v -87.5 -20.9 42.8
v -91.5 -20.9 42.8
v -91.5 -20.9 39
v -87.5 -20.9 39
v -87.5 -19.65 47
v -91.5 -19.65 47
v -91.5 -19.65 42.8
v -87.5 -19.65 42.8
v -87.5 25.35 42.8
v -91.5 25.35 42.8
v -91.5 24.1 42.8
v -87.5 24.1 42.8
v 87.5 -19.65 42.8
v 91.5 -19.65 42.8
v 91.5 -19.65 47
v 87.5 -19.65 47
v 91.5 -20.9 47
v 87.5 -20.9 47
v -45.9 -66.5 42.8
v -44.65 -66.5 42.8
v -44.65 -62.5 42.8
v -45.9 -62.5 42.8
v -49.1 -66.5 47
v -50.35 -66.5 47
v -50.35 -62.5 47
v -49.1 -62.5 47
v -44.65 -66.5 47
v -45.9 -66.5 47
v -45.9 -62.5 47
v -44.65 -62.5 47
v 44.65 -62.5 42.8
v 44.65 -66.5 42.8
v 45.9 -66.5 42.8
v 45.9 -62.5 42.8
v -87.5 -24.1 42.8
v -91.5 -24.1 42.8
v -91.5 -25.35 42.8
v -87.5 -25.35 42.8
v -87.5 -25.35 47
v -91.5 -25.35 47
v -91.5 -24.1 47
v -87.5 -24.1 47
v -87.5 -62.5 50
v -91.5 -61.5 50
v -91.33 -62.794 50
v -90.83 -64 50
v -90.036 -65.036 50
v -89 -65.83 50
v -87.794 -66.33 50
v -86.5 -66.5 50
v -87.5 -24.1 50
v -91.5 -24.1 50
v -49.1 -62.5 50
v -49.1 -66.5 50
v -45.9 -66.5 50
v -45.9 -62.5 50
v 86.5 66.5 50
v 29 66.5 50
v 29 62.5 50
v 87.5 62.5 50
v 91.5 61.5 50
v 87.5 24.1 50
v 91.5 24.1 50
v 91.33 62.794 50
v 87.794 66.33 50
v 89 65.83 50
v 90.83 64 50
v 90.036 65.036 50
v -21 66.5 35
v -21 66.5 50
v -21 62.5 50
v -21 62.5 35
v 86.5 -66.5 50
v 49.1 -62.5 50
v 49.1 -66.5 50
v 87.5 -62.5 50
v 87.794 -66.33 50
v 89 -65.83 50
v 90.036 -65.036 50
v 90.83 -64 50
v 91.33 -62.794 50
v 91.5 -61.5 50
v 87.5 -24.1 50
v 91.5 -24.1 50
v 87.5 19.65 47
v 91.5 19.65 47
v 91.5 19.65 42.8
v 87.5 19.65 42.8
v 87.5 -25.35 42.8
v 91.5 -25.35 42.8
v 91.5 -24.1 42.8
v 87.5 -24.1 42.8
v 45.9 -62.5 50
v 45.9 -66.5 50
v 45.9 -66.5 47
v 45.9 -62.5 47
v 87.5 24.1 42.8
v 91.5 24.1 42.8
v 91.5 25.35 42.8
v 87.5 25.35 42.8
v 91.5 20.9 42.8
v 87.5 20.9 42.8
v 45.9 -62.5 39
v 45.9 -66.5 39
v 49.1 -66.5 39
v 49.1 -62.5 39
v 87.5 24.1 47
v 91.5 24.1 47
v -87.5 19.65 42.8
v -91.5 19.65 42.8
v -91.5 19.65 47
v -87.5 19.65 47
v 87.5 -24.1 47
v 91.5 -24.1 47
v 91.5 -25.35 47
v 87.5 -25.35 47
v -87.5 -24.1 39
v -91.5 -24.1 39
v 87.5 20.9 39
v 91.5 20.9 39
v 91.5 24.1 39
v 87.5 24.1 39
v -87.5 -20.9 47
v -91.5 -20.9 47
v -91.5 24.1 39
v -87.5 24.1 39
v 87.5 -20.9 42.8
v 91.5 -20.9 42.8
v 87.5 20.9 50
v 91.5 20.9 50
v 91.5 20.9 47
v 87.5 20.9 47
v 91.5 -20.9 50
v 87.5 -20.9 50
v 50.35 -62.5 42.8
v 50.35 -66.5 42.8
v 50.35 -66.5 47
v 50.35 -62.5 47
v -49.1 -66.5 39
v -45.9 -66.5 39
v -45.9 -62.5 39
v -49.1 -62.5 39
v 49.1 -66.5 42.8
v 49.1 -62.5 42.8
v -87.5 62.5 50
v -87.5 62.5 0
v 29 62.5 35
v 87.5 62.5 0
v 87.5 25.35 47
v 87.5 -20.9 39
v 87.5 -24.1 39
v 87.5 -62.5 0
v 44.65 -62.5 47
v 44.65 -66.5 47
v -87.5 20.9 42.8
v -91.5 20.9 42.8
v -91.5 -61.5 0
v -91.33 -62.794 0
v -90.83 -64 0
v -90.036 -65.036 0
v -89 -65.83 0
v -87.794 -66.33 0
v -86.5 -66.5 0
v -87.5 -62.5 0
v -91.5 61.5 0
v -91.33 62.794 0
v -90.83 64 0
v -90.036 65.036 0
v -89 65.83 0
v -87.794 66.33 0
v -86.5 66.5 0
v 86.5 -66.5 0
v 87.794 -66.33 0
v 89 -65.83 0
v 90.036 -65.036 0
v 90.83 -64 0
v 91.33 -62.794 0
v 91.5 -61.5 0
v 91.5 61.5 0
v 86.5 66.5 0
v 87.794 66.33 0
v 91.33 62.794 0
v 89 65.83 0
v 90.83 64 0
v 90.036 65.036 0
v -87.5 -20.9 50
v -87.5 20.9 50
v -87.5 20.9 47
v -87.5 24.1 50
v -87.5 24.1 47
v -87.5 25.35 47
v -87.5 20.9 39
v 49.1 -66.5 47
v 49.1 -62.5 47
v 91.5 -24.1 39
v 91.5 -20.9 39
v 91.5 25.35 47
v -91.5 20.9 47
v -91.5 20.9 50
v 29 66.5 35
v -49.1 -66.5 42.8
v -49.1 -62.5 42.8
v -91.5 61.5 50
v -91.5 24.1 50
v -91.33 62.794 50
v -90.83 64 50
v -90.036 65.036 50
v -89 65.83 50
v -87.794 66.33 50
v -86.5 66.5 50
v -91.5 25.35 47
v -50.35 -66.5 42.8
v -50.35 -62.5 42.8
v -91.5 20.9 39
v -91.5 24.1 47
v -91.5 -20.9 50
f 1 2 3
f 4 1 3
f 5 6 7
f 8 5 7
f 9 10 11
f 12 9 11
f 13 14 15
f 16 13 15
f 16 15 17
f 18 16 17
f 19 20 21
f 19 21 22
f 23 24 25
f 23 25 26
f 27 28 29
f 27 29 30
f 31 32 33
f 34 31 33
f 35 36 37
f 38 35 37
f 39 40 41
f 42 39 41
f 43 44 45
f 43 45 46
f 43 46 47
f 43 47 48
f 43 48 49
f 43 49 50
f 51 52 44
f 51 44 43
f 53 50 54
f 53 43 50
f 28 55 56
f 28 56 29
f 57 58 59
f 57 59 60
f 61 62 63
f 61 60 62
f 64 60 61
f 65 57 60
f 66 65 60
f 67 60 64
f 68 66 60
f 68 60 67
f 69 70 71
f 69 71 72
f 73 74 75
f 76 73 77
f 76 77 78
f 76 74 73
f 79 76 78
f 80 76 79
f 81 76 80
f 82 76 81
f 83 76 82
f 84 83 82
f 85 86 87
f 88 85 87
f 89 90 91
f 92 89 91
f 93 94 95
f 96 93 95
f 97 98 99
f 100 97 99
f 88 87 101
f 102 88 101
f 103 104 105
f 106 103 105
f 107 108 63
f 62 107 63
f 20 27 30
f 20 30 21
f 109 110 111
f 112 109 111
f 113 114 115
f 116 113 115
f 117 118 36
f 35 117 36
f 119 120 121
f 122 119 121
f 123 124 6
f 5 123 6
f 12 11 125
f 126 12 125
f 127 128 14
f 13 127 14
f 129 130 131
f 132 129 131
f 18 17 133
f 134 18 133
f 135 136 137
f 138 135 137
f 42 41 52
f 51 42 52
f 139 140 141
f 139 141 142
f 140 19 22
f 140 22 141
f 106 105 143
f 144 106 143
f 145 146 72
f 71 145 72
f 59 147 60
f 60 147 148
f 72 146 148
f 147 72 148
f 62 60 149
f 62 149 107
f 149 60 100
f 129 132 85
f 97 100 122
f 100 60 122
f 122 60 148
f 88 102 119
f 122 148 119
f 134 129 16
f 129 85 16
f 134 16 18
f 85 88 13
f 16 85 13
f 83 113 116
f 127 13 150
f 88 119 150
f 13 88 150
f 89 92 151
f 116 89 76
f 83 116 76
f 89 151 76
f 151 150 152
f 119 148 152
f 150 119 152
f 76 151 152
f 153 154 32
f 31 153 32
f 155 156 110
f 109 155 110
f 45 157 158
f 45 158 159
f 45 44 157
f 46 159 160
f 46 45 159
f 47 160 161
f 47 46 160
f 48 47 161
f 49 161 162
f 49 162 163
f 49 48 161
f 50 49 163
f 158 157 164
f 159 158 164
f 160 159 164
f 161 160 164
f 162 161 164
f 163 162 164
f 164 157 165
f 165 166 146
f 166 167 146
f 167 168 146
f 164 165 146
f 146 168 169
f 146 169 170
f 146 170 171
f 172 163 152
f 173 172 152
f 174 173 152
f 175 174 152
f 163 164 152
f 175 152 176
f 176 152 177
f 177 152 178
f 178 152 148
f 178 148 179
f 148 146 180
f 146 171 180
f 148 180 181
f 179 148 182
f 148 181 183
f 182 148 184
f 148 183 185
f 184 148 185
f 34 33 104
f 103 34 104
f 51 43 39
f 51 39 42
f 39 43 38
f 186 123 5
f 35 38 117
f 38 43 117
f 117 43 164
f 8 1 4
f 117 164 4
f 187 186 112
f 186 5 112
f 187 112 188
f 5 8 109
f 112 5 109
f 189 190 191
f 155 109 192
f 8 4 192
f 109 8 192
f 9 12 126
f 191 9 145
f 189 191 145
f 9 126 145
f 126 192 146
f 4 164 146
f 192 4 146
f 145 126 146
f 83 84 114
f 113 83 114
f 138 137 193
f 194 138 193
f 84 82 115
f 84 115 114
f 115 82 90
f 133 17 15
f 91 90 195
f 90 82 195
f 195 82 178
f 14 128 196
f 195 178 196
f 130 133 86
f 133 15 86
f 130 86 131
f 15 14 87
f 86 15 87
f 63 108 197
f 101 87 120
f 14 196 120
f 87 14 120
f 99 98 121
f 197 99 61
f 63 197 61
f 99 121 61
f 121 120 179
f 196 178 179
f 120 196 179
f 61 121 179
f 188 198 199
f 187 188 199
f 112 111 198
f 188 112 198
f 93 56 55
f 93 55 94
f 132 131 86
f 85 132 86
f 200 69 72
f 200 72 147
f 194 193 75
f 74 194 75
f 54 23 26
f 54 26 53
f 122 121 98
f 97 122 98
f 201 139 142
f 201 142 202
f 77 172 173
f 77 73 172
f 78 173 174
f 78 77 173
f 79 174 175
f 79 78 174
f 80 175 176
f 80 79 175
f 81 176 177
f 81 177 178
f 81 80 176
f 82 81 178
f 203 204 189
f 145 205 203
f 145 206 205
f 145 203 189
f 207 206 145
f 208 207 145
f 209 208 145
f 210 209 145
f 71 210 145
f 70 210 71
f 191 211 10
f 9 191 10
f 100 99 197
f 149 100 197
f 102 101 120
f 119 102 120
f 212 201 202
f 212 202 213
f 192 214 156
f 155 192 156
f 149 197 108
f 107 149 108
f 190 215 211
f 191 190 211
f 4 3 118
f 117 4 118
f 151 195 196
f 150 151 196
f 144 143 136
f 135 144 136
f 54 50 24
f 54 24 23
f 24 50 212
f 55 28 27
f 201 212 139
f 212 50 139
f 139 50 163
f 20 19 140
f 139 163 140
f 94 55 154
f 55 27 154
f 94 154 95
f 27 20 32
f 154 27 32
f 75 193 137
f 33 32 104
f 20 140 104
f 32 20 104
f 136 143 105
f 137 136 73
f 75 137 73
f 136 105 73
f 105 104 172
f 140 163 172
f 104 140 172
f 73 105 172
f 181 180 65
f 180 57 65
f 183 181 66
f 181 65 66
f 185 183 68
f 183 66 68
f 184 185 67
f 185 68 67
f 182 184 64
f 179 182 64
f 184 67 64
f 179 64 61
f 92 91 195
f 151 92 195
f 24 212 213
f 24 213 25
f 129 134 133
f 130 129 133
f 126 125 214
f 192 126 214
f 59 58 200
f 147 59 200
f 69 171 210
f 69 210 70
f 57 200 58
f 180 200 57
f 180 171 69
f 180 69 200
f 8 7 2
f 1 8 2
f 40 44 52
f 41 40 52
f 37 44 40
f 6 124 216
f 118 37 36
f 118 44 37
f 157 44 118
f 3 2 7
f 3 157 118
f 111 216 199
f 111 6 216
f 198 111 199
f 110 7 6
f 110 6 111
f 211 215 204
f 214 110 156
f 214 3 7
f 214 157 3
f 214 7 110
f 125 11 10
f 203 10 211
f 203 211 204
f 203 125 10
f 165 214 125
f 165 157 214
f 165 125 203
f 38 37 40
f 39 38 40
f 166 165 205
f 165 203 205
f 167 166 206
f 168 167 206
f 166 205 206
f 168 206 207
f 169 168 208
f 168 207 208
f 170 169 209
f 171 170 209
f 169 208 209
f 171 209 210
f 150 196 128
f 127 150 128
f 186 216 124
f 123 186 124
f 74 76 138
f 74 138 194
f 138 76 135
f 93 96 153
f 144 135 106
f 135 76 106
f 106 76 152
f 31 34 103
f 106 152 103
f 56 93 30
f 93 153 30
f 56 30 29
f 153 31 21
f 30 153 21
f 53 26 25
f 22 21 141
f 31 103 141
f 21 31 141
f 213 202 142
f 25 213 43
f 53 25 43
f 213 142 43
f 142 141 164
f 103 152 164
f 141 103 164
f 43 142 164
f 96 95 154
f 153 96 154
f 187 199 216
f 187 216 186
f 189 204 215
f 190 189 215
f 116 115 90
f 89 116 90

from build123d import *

# Parameters (mm, degrees)
ESQUISSE2_W             = 183
ESQUISSE2_H             = 133
BOSS_EXTRU_2_DEPTH      = 50
ESQUISSE3_W             = 50
ESQUISSE3_H             = 15
ENL_V_MAT_EXTRU_1_DEPTH = 50
CONG_1_R                = 5
ENL_V_MAT_EXTRU_3_DEPTH = 4
ENL_V_MAT_EXTRU_4_DEPTH = 4
ENL_V_MAT_EXTRU_5_DEPTH = 4


with BuildPart() as part:
    # Esquisse2 → Boss.-Extru.2 (new body)
    with BuildSketch(Plane.XY):
        Rectangle(ESQUISSE2_W, ESQUISSE2_H)
        Polygon((-85.996240602, -62.5), (-87.5, -62.5), (-87.5, 62.5), (87.5, 62.5), (87.5, -62.5), align=None, mode=Mode.SUBTRACT)
    extrude(amount=BOSS_EXTRU_2_DEPTH)

    # Esquisse3 → Enlèv. mat.-Extru.1 (cut)
    with BuildSketch(Plane(origin=(0, 66.5, 0), x_dir=(1, 0, 0), z_dir=(0, 1, 0))):
        with Locations((4, -42.5)):
            Rectangle(ESQUISSE3_W, ESQUISSE3_H)
    extrude(amount=-ENL_V_MAT_EXTRU_1_DEPTH, mode=Mode.SUBTRACT)

    # Congé1
    cong_1_edges = [part.edges().sort_by_distance(p)[0] for p in [
        (91.5, -66.5, 25),
        (91.5, 66.5, 25),
        (-91.5, 66.5, 25),
        (-91.5, -66.5, 25),
    ]]
    fillet(cong_1_edges, radius=CONG_1_R)

    # Esquisse6 → Enlèv. mat.-Extru.3 (cut)
    with BuildSketch(Plane(origin=(91.5, 0, 0), x_dir=(0, 0, -1), z_dir=(1, 0, 0))):
        Polygon((-50, 20.9), (-47, 20.9), (-47, 19.65), (-42.8, 19.65), (-42.8, 20.9), (-39, 20.9), (-39, 24.1), (-42.8, 24.1), (-42.8, 25.35), (-47, 25.35), (-47, 24.1), (-50, 24.1), align=None)
        Polygon((-50, -24.1), (-47, -24.1), (-47, -25.35), (-42.8, -25.35), (-42.8, -24.1), (-39, -24.1), (-39, -20.9), (-42.8, -20.9), (-42.8, -19.65), (-47, -19.65), (-47, -20.9), (-50, -20.9), align=None)
    extrude(amount=-ENL_V_MAT_EXTRU_3_DEPTH, mode=Mode.SUBTRACT)

    # Esquisse7 → Enlèv. mat.-Extru.4 (cut)
    with BuildSketch(Plane.ZY.offset(91.5)):
        Polygon((47, 20.9), (50, 20.9), (50, 24.1), (47, 24.1), (47, 25.35), (42.8, 25.35), (42.8, 24.1), (39, 24.1), (39, 20.9), (42.8, 20.9), (42.8, 19.65), (47, 19.65), align=None)
        Polygon((47, -24.1), (50, -24.1), (50, -20.9), (47, -20.9), (47, -19.65), (42.8, -19.65), (42.8, -20.9), (39, -20.9), (39, -24.1), (42.8, -24.1), (42.8, -25.35), (47, -25.35), align=None)
    extrude(amount=-ENL_V_MAT_EXTRU_4_DEPTH, mode=Mode.SUBTRACT)

    # Esquisse9 → Enlèv. mat.-Extru.5 (cut)
    with BuildSketch(Plane.XZ.offset(66.5)):
        Polygon((-49.1, 50), (-45.9, 50), (-45.9, 47), (-44.65, 47), (-44.65, 42.8), (-45.9, 42.8), (-45.9, 39), (-49.1, 39), (-49.1, 42.8), (-50.35, 42.8), (-50.35, 47), (-49.1, 47), align=None)
        Polygon((45.9, 50), (45.9, 47), (44.65, 47), (44.65, 42.8), (45.9, 42.8), (45.9, 39), (49.1, 39), (49.1, 42.8), (50.35, 42.8), (50.35, 47), (49.1, 47), (49.1, 50), align=None)
    extrude(amount=-ENL_V_MAT_EXTRU_5_DEPTH, mode=Mode.SUBTRACT)


solid = part.part
